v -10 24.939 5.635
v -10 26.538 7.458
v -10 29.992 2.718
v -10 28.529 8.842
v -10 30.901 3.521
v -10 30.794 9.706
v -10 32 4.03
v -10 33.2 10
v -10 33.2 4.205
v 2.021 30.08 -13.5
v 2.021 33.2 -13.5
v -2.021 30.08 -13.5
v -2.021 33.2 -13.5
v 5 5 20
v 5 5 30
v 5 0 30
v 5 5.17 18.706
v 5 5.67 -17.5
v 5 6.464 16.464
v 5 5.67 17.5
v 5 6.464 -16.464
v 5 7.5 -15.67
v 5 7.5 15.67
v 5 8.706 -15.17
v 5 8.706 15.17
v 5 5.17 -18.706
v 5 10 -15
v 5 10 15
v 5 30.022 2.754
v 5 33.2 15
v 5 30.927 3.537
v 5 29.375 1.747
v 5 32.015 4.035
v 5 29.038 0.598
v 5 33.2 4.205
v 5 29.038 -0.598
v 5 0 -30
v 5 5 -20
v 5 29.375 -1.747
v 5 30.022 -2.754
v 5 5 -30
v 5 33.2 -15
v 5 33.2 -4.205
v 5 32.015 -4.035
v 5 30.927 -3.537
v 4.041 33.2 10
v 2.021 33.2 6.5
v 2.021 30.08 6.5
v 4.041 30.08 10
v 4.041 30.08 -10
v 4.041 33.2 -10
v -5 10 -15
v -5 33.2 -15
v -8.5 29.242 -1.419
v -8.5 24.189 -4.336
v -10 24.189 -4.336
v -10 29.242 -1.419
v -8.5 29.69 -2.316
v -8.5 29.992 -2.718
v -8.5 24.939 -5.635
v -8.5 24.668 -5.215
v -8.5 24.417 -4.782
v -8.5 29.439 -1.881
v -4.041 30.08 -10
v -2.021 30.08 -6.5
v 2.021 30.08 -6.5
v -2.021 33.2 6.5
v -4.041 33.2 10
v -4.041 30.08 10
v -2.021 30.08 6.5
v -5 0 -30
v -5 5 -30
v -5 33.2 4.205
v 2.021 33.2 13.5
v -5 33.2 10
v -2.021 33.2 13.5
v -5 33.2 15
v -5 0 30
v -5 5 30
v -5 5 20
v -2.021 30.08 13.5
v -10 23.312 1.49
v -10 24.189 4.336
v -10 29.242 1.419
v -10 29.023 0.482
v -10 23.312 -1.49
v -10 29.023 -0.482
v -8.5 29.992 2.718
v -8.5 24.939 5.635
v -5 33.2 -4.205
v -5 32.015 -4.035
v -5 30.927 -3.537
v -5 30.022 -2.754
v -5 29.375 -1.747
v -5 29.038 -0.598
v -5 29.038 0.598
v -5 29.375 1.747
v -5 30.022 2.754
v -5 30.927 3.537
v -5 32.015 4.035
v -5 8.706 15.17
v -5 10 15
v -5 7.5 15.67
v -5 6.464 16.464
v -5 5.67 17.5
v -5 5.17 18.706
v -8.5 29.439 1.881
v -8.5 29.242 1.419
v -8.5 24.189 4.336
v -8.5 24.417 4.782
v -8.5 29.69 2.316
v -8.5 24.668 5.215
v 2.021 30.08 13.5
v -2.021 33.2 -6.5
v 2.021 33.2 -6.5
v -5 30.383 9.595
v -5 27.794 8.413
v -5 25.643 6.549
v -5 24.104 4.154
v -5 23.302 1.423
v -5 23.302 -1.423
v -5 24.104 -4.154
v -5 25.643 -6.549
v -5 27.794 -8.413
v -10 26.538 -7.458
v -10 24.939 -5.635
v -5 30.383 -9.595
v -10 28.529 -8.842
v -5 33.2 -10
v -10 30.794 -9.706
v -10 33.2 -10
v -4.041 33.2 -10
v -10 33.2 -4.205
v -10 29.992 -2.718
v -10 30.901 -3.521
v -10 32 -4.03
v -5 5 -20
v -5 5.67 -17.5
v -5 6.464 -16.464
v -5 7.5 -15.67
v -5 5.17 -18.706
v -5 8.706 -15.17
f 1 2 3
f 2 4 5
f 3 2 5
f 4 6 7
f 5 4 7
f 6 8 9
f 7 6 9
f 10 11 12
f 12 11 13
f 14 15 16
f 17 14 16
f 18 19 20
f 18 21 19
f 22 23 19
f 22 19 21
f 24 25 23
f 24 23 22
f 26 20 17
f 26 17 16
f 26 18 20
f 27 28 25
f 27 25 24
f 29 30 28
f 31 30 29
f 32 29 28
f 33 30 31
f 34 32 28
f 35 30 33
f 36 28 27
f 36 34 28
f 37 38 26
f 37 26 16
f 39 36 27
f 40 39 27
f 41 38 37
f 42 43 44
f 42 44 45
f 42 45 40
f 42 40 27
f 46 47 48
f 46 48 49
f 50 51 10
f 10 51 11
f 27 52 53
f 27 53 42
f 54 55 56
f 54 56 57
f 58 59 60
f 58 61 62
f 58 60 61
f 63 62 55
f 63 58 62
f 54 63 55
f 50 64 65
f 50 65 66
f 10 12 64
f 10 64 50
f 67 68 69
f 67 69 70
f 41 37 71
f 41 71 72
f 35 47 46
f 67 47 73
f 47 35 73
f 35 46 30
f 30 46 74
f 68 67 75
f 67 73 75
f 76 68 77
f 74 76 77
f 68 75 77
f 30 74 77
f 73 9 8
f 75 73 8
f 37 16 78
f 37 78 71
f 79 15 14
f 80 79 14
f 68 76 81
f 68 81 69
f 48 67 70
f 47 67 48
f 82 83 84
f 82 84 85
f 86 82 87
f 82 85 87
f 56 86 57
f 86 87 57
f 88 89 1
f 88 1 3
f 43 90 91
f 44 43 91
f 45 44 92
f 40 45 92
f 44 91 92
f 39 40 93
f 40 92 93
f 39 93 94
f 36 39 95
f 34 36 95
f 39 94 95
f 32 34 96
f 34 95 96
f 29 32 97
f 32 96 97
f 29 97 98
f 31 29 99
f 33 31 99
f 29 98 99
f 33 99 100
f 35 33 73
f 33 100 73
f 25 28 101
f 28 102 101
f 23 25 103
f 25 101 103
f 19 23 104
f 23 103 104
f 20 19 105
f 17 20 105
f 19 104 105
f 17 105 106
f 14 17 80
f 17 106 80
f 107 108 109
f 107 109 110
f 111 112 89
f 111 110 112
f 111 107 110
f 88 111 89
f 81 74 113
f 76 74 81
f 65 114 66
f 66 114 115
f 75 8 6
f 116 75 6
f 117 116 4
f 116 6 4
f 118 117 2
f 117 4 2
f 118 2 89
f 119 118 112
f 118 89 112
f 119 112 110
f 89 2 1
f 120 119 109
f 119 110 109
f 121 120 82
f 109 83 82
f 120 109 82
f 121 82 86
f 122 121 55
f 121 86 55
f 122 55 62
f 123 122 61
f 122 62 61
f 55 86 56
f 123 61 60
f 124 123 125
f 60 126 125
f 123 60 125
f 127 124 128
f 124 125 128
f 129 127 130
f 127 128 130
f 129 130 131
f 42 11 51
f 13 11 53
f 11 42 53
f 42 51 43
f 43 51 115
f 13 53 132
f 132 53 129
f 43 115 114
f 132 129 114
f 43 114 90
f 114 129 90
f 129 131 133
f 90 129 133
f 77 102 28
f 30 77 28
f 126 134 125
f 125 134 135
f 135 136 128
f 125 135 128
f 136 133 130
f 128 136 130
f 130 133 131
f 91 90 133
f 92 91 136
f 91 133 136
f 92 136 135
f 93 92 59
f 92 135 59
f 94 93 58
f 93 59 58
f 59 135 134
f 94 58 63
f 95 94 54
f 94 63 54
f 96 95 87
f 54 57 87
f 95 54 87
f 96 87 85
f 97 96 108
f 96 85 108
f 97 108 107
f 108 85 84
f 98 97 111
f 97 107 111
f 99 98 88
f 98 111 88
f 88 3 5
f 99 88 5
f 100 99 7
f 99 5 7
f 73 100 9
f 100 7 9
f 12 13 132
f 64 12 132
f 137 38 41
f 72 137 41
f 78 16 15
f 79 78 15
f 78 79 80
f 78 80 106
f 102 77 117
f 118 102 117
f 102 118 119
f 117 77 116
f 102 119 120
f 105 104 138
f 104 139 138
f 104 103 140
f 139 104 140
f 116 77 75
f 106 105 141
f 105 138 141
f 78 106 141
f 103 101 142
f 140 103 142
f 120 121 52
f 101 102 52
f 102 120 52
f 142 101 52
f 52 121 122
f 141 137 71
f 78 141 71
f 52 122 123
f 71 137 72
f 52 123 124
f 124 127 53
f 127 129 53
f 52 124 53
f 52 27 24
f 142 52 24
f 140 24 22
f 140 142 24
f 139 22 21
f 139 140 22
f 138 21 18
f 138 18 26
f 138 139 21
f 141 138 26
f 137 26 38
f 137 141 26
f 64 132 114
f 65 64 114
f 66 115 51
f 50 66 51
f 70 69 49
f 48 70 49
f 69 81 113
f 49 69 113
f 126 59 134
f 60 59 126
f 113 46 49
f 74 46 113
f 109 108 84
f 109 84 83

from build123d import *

# Parameters (mm, degrees)
SKETCH1_W                    = 10
SKETCH1_H                    = 30
BOSS_EXTRUDE1_DEPTH          = 33.2
SKETCH2_R                    = 4.205
CUT_EXTRUDE1_DEPTH           = 38.778830051
CUT_EXTRUDE2_DEPTH           = 3.12
SKETCH4_W                    = 60
SKETCH4_H                    = 5
BOSS_EXTRUDE2_DEPTH          = 10
FILLET1_R                    = 5
BOSS_EXTRUDE3_START          = 5
BOSS_EXTRUDE3_DEPTH          = 5
CUT_EXTRUDE_THIN1_DEPTH      = 48.19364364
CUT_EXTRUDE_THIN1_DEPTH_BACK = 1.5
CUT_EXTRUDE_THIN2_DEPTH      = 48.19364364
CUT_EXTRUDE_THIN2_DEPTH_BACK = 1.5


with BuildPart() as part:
    # Sketch1 → Boss-Extrude1 (new body)
    with BuildSketch(Plane(origin=(0, 0, 0), x_dir=(1, 0, 0), z_dir=(0, 1, 0))):
        Rectangle(SKETCH1_W, SKETCH1_H)
    extrude(amount=BOSS_EXTRUDE1_DEPTH)

    # Sketch2 → Cut-Extrude1 (cut, through all)
    with BuildSketch(Plane.ZY.offset(5)):
        with Locations((0, 33.2)):
            Circle(SKETCH2_R)
    extrude(amount=-CUT_EXTRUDE1_DEPTH, mode=Mode.SUBTRACT)

    # Sketch3 → Cut-Extrude2 (cut)
    with BuildSketch(Plane(origin=(0, 33.2, 0), x_dir=(1, 0, 0), z_dir=(0, 1, 0))):
        Polygon((2.020725942, 6.5), (4.041451884, 10), (2.020725942, 13.5), (-2.020725942, 13.5), (-4.041451884, 10), (-2.020725942, 6.5), align=None)
    cut_extrude2 = extrude(amount=-CUT_EXTRUDE2_DEPTH, mode=Mode.SUBTRACT)

    # Mirror1: Cut-Extrude2 across plane
    add(cut_extrude2.mirror(Plane.XY), mode=Mode.SUBTRACT)

    # Sketch4 → Boss-Extrude2 (add)
    with BuildSketch(Plane(origin=(5, 0, 0), x_dir=(0, 0, -1), z_dir=(1, 0, 0))):
        with Locations((0, 2.5)):
            Rectangle(SKETCH4_W, SKETCH4_H)
    extrude(amount=-BOSS_EXTRUDE2_DEPTH)

    # Fillet1
    fillet1_edges = [part.edges().sort_by_distance(p)[0] for p in [
        (0, 5, -15),
        (0, 5, 15),
    ]]
    fillet(fillet1_edges, radius=FILLET1_R)

    # Sketch5 → Boss-Extrude3 (add)
    with BuildSketch(Plane.ZY.offset(5).offset(BOSS_EXTRUDE3_START)):
        with BuildLine():
            Line((-10, 33.2), (-4.205, 33.2))
            ThreePointArc((-4.205, 33.2), (0, 28.995), (4.205, 33.2))
            Line((4.205, 33.2), (10, 33.2))
            ThreePointArc((10, 33.2), (0, 23.2), (-10, 33.2))
        make_face()
    extrude(amount=-BOSS_EXTRUDE3_DEPTH)

    # Sketch6 → Cut-Extrude-Thin1 (cut, two sides: drawn at the far end of the back side and taken through both)
    with BuildSketch(Plane.ZY.offset(10).offset(-CUT_EXTRUDE_THIN1_DEPTH_BACK)):
        Polygon((-0.649519053, 32.825), (4.350480947, 24.164745962), (5.649519053, 24.914745962), (0.649519053, 33.575), align=None)
    extrude(amount=CUT_EXTRUDE_THIN1_DEPTH + CUT_EXTRUDE_THIN1_DEPTH_BACK, mode=Mode.SUBTRACT)

    # Sketch7 → Cut-Extrude-Thin2 (cut, two sides: drawn at the far end of the back side and taken through both)
    with BuildSketch(Plane.ZY.offset(10).offset(-CUT_EXTRUDE_THIN2_DEPTH_BACK)):
        Polygon((-0.649519053, 33.575), (-5.649519053, 24.914745962), (-4.350480947, 24.164745962), (0.649519053, 32.825), align=None)
    extrude(amount=CUT_EXTRUDE_THIN2_DEPTH + CUT_EXTRUDE_THIN2_DEPTH_BACK, mode=Mode.SUBTRACT)


solid = part.part
